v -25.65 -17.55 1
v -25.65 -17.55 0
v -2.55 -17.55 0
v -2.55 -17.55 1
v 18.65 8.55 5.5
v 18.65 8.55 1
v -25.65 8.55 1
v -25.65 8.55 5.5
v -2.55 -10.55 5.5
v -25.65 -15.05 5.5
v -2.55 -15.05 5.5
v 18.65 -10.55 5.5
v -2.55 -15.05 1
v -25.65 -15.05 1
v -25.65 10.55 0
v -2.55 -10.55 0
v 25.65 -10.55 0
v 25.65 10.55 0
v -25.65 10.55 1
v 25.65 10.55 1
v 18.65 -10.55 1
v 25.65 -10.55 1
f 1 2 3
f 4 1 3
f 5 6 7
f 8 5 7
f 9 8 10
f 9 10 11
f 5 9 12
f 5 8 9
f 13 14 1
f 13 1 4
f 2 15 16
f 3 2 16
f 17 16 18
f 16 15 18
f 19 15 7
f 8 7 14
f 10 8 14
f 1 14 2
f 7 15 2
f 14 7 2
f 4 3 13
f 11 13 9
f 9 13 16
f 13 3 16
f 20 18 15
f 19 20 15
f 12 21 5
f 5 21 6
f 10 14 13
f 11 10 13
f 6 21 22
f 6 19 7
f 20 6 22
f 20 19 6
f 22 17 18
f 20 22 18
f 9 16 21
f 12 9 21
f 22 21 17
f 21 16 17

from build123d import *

# Parameters (mm, degrees)
F1_DEPTH = 1
F3_DEPTH = 4.5


with BuildPart() as f1:
    # F0 (on Top) → F1 (new body)
    with BuildSketch(Plane.XY):
        Polygon((-2.55, -10.55), (25.65, -10.55), (25.65, 10.55), (-2.55, 10.55), (-25.65, 10.55), (-25.65, -10.55), (-25.65, -17.55), (-2.55, -17.55), align=None)
    extrude(amount=F1_DEPTH)

    # F2 (on face) → F3 (join)
    with BuildSketch(Plane.XY.offset(1)):
        Polygon((18.65, -10.55), (18.65, 8.55), (-25.65, 8.55), (-25.65, -15.05), (-2.55, -15.05), (-2.55, -10.55), align=None)
    extrude(amount=F3_DEPTH)


solid = f1.part
